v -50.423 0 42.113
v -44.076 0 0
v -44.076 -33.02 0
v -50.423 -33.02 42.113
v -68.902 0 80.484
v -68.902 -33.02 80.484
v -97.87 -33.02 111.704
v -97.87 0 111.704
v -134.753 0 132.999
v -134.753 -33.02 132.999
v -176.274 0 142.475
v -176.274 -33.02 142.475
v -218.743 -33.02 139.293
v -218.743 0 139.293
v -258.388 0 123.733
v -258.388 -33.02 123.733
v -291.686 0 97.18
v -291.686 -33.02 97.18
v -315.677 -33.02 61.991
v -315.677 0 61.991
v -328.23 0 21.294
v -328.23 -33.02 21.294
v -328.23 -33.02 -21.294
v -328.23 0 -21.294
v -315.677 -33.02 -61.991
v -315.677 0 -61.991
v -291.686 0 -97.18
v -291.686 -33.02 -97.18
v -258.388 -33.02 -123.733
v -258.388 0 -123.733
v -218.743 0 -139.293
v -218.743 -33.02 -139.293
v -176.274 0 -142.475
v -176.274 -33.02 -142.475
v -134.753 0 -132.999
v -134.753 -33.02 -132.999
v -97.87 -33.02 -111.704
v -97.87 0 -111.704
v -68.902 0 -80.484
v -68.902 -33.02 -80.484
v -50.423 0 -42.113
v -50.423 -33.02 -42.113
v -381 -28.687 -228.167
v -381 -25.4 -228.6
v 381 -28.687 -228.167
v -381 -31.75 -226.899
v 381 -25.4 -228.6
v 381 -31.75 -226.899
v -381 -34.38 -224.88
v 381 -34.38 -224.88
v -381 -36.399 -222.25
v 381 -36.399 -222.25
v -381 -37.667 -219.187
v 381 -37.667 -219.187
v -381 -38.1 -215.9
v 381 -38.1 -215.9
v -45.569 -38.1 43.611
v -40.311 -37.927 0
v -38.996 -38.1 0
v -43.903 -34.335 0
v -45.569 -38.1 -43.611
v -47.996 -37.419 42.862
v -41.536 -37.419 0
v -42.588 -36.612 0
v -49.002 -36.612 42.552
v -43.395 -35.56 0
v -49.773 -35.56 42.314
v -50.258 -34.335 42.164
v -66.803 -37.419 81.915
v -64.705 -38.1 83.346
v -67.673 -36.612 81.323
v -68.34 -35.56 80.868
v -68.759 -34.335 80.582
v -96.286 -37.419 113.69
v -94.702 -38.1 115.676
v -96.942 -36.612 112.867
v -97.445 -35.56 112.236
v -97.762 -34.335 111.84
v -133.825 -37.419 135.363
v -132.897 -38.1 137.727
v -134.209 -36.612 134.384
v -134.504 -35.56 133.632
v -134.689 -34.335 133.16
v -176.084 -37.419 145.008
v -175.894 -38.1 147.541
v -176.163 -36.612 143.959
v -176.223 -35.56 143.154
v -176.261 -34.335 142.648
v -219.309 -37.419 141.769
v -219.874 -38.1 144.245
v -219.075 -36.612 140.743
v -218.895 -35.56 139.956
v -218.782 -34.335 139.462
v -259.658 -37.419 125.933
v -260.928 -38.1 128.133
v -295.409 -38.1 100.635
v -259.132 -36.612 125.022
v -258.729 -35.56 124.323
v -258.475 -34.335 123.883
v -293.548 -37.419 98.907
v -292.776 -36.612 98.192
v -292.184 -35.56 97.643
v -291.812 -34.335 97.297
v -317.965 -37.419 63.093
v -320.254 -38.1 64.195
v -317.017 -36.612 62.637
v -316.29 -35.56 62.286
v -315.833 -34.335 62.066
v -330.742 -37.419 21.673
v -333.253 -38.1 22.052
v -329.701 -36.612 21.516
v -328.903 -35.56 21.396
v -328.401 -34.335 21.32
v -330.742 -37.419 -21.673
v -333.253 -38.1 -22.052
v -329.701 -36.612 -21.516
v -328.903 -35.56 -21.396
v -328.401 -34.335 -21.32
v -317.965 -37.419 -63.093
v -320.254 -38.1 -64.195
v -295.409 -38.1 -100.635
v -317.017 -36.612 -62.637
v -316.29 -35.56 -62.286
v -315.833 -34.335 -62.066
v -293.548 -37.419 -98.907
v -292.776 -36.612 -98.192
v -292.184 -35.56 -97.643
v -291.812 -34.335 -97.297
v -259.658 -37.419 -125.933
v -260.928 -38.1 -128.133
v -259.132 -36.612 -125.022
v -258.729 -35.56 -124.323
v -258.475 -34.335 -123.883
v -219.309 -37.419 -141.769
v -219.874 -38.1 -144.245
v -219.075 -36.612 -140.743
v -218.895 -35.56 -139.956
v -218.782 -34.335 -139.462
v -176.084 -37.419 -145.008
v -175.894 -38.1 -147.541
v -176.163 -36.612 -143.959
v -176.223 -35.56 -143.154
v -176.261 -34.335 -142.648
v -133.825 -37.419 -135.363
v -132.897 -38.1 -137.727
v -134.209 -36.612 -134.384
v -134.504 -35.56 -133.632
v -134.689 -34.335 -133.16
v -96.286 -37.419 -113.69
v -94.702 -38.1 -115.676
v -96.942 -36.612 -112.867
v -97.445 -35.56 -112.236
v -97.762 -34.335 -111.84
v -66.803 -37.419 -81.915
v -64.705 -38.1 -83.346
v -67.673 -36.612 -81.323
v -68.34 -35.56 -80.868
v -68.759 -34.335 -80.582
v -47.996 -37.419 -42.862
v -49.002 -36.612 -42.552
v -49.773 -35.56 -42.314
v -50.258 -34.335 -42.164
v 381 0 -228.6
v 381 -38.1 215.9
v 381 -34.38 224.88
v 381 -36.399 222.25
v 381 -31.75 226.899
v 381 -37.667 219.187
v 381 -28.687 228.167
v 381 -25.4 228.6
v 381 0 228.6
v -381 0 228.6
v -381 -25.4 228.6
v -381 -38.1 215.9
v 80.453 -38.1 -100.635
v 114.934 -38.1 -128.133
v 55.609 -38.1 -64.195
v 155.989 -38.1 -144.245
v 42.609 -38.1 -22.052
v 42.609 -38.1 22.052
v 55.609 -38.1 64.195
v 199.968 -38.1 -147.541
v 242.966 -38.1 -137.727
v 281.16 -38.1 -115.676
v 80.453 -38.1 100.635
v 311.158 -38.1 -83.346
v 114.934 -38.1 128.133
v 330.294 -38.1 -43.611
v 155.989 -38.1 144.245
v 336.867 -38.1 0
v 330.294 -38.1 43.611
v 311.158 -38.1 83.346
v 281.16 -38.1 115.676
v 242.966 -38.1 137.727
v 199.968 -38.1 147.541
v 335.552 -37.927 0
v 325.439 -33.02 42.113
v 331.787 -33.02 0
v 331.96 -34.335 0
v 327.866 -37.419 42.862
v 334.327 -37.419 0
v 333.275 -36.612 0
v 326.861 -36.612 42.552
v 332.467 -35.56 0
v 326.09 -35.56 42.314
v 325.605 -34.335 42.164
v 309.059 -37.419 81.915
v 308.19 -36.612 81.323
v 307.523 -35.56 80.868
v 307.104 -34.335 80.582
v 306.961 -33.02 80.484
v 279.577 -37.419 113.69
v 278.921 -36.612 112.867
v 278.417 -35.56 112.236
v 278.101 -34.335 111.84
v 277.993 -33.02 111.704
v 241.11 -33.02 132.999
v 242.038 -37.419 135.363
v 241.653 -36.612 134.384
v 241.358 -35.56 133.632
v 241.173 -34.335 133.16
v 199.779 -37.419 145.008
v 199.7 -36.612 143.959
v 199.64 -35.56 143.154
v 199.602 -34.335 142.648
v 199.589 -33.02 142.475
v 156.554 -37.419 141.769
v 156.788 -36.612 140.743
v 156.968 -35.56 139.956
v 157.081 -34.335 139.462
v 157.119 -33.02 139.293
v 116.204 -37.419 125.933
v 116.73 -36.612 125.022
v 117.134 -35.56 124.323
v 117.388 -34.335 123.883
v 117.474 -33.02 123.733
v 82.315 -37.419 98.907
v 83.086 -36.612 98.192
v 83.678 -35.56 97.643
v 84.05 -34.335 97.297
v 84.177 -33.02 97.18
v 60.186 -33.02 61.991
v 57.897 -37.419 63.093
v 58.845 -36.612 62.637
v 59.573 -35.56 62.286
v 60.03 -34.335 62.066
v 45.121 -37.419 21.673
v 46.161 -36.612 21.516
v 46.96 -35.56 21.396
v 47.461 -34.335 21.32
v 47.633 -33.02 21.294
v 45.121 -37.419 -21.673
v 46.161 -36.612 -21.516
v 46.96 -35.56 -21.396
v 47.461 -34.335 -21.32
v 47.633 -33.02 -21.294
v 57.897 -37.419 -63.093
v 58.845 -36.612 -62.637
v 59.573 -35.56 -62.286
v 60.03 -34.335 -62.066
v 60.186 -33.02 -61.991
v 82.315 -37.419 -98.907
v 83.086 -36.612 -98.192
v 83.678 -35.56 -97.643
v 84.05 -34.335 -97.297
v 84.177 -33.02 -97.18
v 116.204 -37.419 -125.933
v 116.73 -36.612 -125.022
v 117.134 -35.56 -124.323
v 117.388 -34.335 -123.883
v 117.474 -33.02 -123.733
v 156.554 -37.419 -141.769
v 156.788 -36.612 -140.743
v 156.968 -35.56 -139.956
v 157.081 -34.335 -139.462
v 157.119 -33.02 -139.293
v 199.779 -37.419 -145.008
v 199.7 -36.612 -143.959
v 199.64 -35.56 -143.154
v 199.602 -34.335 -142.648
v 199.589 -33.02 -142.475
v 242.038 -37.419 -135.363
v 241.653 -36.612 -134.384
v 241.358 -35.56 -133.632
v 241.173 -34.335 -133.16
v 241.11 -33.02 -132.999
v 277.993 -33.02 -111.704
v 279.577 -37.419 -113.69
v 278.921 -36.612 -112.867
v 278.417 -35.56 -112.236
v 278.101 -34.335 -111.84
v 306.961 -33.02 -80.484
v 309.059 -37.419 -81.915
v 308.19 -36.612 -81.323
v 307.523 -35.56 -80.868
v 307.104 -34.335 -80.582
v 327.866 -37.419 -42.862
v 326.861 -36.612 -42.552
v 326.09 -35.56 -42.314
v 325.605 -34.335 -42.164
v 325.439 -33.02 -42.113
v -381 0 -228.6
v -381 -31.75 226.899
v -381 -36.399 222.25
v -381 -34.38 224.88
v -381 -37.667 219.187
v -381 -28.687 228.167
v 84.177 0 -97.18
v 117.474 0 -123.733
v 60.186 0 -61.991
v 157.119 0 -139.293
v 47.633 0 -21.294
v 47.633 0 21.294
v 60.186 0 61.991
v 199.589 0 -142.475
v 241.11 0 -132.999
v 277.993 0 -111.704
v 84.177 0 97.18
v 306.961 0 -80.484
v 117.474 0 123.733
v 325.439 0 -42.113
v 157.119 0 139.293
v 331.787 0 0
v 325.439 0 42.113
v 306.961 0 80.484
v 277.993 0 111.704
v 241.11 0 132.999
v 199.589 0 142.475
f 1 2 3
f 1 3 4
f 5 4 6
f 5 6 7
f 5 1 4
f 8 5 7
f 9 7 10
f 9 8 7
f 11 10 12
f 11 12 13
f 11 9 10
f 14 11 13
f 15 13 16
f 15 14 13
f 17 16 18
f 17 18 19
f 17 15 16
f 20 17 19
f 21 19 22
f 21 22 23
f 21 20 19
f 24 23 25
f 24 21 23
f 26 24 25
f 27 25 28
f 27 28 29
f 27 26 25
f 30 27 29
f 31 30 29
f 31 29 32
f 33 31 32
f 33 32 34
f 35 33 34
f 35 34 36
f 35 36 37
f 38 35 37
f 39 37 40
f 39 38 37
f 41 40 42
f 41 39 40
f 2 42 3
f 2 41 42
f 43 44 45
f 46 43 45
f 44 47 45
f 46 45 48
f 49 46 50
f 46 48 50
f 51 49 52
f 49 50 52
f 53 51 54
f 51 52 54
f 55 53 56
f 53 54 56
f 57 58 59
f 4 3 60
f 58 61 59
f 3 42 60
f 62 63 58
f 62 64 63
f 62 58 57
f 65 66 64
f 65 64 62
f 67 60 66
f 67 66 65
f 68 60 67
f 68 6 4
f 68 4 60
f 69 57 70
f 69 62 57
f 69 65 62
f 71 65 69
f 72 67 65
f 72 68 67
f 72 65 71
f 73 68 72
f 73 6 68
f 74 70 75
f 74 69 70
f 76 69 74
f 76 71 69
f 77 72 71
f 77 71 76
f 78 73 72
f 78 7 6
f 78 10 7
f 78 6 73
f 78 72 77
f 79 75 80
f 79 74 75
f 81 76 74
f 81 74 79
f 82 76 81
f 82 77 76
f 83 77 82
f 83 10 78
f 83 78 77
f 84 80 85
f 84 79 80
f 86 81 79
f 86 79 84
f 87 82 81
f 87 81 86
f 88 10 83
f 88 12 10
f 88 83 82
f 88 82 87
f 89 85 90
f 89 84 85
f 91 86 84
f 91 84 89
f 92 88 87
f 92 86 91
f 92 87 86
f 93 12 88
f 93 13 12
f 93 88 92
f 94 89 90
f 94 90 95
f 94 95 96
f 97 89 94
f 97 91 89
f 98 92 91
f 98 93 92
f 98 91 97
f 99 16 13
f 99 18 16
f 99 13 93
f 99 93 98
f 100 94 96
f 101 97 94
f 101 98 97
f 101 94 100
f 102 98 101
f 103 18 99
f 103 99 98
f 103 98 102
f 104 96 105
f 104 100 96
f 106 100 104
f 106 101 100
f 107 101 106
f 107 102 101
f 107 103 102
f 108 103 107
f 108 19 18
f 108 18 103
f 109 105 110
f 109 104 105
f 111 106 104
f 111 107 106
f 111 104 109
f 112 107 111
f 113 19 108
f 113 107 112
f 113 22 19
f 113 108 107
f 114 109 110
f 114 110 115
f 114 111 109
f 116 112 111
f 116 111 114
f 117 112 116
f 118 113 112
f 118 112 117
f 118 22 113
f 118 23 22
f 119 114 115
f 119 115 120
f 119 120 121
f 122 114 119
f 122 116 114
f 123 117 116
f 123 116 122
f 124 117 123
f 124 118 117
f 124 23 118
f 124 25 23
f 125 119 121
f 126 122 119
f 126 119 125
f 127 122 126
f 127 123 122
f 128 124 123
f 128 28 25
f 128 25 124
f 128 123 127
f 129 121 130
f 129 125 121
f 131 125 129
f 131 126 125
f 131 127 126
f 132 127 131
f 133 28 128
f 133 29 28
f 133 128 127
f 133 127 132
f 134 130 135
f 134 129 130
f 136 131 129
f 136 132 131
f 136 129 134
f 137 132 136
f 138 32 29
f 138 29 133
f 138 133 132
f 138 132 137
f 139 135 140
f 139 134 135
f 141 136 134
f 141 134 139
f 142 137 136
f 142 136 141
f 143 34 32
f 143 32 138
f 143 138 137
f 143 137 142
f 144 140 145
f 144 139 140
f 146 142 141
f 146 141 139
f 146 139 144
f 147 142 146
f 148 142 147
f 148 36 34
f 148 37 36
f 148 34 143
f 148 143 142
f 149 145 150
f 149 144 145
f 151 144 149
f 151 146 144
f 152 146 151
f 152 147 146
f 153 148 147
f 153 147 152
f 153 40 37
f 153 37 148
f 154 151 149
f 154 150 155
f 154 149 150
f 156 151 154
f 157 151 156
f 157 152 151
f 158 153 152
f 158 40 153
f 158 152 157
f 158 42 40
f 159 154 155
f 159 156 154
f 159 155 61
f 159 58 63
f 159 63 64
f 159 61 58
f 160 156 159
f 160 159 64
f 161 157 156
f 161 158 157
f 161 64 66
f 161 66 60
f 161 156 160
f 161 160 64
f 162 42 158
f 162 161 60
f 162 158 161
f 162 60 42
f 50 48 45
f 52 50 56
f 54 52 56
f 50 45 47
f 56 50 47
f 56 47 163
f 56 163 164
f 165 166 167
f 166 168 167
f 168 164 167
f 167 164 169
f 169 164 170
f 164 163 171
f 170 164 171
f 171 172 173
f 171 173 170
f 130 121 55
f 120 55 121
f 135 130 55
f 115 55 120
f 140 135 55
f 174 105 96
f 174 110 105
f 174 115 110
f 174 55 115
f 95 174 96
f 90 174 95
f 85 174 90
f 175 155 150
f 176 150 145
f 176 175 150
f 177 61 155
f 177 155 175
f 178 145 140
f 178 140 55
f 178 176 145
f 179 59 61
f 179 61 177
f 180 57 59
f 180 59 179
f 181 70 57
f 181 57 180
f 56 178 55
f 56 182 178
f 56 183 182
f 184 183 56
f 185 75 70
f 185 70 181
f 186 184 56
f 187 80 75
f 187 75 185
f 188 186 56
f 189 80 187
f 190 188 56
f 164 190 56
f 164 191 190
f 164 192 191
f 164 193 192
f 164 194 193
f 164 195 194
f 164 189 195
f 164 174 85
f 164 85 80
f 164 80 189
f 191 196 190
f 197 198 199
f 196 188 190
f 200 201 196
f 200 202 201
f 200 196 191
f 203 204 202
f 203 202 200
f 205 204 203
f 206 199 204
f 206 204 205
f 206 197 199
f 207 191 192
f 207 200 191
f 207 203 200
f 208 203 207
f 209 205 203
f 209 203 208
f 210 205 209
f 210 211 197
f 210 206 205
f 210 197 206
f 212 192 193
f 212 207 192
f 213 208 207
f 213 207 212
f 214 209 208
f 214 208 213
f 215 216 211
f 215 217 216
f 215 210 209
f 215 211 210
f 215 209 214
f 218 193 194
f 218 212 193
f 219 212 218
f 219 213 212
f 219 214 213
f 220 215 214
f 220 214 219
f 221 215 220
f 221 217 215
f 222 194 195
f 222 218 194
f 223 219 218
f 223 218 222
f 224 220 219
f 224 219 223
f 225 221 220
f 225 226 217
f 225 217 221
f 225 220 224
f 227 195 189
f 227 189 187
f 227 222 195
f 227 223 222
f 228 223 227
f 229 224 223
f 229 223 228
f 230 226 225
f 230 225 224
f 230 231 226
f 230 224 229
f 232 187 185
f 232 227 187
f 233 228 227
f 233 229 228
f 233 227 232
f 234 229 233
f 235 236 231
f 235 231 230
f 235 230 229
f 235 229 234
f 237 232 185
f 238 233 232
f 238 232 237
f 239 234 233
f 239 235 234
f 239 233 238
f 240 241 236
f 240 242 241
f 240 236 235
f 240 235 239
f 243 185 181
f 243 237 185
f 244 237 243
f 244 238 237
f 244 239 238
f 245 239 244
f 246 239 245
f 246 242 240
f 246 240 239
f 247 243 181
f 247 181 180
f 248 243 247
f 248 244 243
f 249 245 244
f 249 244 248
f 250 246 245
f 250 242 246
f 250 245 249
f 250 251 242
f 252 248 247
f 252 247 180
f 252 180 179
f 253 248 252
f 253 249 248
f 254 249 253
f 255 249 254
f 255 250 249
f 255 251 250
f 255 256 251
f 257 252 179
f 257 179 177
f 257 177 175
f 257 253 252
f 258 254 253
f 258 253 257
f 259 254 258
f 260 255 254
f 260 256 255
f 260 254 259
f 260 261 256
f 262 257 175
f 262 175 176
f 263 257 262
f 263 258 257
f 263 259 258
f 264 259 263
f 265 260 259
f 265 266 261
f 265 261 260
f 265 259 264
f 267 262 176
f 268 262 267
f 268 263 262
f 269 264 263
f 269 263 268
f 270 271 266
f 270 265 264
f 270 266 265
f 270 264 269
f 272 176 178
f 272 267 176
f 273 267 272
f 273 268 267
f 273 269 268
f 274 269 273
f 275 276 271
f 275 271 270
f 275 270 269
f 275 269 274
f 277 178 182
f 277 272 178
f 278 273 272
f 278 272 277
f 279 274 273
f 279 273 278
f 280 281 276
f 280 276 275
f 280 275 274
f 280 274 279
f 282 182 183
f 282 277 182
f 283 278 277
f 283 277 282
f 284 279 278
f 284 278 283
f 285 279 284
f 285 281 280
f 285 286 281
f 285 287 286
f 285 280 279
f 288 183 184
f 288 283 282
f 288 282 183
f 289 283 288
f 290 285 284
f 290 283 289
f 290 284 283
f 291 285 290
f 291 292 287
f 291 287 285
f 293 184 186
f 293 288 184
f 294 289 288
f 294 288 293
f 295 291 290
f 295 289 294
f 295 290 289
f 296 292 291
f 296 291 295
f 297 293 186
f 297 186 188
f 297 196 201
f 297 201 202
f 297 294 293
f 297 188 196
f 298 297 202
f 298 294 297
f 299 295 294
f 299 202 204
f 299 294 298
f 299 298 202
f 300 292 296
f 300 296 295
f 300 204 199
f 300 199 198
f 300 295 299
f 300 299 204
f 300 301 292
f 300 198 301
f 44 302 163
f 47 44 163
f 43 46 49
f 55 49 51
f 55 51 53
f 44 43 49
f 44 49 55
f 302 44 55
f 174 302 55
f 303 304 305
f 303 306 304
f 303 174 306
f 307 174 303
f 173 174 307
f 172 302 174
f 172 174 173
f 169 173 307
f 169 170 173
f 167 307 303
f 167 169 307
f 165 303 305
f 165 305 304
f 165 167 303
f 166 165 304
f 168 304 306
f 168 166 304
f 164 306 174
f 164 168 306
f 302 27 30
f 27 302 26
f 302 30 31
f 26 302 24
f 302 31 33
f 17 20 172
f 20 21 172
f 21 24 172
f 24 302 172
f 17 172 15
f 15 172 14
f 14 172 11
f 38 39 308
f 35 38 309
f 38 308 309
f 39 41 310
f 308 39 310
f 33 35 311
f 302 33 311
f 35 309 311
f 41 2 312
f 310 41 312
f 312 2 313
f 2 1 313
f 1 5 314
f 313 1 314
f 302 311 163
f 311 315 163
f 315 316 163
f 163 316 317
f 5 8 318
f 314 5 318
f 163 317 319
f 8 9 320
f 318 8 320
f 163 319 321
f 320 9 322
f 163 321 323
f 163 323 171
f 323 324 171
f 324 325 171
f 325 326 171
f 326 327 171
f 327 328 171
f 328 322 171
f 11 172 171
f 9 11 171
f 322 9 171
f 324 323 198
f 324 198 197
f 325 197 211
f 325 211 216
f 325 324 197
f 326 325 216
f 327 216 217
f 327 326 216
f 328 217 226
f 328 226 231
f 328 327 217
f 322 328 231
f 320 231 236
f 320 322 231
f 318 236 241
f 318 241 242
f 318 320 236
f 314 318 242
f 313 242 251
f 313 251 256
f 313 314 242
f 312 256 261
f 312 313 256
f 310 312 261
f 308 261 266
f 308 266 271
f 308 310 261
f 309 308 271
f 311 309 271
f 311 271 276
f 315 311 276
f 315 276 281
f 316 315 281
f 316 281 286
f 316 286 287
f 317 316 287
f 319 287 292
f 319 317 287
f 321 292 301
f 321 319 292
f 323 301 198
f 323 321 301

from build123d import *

# Parameters (mm, degrees)
F0_W     = 762
F0_H     = 457.2
F0_R     = 142.875
F1_DEPTH = 38.1
F2_R     = 12.7
F3_R     = 5.08


with BuildPart() as f1:
    # F0 (on Front) → F1 (new body)
    with BuildSketch(Plane.XZ):
        Rectangle(F0_W, F0_H)
        with Locations((-186.950803, 0)):
            Circle(F0_R, mode=Mode.SUBTRACT)
        with Locations((188.911736, 0)):
            Circle(F0_R, mode=Mode.SUBTRACT)
    extrude(amount=F1_DEPTH)

    # F2
    f2_edges = [f1.edges().sort_by_distance(p)[0] for p in [
        (0, -38.1, 228.6),
        (0, -38.1, -228.6),
    ]]
    fillet(f2_edges, radius=F2_R)

    # F3
    f3_edges = [f1.edges().sort_by_distance(p)[0] for p in [
        (-329.825803, -38.1, 0),
        (46.036736, -38.1, 0),
    ]]
    fillet(f3_edges, radius=F3_R)


solid = f1.part
